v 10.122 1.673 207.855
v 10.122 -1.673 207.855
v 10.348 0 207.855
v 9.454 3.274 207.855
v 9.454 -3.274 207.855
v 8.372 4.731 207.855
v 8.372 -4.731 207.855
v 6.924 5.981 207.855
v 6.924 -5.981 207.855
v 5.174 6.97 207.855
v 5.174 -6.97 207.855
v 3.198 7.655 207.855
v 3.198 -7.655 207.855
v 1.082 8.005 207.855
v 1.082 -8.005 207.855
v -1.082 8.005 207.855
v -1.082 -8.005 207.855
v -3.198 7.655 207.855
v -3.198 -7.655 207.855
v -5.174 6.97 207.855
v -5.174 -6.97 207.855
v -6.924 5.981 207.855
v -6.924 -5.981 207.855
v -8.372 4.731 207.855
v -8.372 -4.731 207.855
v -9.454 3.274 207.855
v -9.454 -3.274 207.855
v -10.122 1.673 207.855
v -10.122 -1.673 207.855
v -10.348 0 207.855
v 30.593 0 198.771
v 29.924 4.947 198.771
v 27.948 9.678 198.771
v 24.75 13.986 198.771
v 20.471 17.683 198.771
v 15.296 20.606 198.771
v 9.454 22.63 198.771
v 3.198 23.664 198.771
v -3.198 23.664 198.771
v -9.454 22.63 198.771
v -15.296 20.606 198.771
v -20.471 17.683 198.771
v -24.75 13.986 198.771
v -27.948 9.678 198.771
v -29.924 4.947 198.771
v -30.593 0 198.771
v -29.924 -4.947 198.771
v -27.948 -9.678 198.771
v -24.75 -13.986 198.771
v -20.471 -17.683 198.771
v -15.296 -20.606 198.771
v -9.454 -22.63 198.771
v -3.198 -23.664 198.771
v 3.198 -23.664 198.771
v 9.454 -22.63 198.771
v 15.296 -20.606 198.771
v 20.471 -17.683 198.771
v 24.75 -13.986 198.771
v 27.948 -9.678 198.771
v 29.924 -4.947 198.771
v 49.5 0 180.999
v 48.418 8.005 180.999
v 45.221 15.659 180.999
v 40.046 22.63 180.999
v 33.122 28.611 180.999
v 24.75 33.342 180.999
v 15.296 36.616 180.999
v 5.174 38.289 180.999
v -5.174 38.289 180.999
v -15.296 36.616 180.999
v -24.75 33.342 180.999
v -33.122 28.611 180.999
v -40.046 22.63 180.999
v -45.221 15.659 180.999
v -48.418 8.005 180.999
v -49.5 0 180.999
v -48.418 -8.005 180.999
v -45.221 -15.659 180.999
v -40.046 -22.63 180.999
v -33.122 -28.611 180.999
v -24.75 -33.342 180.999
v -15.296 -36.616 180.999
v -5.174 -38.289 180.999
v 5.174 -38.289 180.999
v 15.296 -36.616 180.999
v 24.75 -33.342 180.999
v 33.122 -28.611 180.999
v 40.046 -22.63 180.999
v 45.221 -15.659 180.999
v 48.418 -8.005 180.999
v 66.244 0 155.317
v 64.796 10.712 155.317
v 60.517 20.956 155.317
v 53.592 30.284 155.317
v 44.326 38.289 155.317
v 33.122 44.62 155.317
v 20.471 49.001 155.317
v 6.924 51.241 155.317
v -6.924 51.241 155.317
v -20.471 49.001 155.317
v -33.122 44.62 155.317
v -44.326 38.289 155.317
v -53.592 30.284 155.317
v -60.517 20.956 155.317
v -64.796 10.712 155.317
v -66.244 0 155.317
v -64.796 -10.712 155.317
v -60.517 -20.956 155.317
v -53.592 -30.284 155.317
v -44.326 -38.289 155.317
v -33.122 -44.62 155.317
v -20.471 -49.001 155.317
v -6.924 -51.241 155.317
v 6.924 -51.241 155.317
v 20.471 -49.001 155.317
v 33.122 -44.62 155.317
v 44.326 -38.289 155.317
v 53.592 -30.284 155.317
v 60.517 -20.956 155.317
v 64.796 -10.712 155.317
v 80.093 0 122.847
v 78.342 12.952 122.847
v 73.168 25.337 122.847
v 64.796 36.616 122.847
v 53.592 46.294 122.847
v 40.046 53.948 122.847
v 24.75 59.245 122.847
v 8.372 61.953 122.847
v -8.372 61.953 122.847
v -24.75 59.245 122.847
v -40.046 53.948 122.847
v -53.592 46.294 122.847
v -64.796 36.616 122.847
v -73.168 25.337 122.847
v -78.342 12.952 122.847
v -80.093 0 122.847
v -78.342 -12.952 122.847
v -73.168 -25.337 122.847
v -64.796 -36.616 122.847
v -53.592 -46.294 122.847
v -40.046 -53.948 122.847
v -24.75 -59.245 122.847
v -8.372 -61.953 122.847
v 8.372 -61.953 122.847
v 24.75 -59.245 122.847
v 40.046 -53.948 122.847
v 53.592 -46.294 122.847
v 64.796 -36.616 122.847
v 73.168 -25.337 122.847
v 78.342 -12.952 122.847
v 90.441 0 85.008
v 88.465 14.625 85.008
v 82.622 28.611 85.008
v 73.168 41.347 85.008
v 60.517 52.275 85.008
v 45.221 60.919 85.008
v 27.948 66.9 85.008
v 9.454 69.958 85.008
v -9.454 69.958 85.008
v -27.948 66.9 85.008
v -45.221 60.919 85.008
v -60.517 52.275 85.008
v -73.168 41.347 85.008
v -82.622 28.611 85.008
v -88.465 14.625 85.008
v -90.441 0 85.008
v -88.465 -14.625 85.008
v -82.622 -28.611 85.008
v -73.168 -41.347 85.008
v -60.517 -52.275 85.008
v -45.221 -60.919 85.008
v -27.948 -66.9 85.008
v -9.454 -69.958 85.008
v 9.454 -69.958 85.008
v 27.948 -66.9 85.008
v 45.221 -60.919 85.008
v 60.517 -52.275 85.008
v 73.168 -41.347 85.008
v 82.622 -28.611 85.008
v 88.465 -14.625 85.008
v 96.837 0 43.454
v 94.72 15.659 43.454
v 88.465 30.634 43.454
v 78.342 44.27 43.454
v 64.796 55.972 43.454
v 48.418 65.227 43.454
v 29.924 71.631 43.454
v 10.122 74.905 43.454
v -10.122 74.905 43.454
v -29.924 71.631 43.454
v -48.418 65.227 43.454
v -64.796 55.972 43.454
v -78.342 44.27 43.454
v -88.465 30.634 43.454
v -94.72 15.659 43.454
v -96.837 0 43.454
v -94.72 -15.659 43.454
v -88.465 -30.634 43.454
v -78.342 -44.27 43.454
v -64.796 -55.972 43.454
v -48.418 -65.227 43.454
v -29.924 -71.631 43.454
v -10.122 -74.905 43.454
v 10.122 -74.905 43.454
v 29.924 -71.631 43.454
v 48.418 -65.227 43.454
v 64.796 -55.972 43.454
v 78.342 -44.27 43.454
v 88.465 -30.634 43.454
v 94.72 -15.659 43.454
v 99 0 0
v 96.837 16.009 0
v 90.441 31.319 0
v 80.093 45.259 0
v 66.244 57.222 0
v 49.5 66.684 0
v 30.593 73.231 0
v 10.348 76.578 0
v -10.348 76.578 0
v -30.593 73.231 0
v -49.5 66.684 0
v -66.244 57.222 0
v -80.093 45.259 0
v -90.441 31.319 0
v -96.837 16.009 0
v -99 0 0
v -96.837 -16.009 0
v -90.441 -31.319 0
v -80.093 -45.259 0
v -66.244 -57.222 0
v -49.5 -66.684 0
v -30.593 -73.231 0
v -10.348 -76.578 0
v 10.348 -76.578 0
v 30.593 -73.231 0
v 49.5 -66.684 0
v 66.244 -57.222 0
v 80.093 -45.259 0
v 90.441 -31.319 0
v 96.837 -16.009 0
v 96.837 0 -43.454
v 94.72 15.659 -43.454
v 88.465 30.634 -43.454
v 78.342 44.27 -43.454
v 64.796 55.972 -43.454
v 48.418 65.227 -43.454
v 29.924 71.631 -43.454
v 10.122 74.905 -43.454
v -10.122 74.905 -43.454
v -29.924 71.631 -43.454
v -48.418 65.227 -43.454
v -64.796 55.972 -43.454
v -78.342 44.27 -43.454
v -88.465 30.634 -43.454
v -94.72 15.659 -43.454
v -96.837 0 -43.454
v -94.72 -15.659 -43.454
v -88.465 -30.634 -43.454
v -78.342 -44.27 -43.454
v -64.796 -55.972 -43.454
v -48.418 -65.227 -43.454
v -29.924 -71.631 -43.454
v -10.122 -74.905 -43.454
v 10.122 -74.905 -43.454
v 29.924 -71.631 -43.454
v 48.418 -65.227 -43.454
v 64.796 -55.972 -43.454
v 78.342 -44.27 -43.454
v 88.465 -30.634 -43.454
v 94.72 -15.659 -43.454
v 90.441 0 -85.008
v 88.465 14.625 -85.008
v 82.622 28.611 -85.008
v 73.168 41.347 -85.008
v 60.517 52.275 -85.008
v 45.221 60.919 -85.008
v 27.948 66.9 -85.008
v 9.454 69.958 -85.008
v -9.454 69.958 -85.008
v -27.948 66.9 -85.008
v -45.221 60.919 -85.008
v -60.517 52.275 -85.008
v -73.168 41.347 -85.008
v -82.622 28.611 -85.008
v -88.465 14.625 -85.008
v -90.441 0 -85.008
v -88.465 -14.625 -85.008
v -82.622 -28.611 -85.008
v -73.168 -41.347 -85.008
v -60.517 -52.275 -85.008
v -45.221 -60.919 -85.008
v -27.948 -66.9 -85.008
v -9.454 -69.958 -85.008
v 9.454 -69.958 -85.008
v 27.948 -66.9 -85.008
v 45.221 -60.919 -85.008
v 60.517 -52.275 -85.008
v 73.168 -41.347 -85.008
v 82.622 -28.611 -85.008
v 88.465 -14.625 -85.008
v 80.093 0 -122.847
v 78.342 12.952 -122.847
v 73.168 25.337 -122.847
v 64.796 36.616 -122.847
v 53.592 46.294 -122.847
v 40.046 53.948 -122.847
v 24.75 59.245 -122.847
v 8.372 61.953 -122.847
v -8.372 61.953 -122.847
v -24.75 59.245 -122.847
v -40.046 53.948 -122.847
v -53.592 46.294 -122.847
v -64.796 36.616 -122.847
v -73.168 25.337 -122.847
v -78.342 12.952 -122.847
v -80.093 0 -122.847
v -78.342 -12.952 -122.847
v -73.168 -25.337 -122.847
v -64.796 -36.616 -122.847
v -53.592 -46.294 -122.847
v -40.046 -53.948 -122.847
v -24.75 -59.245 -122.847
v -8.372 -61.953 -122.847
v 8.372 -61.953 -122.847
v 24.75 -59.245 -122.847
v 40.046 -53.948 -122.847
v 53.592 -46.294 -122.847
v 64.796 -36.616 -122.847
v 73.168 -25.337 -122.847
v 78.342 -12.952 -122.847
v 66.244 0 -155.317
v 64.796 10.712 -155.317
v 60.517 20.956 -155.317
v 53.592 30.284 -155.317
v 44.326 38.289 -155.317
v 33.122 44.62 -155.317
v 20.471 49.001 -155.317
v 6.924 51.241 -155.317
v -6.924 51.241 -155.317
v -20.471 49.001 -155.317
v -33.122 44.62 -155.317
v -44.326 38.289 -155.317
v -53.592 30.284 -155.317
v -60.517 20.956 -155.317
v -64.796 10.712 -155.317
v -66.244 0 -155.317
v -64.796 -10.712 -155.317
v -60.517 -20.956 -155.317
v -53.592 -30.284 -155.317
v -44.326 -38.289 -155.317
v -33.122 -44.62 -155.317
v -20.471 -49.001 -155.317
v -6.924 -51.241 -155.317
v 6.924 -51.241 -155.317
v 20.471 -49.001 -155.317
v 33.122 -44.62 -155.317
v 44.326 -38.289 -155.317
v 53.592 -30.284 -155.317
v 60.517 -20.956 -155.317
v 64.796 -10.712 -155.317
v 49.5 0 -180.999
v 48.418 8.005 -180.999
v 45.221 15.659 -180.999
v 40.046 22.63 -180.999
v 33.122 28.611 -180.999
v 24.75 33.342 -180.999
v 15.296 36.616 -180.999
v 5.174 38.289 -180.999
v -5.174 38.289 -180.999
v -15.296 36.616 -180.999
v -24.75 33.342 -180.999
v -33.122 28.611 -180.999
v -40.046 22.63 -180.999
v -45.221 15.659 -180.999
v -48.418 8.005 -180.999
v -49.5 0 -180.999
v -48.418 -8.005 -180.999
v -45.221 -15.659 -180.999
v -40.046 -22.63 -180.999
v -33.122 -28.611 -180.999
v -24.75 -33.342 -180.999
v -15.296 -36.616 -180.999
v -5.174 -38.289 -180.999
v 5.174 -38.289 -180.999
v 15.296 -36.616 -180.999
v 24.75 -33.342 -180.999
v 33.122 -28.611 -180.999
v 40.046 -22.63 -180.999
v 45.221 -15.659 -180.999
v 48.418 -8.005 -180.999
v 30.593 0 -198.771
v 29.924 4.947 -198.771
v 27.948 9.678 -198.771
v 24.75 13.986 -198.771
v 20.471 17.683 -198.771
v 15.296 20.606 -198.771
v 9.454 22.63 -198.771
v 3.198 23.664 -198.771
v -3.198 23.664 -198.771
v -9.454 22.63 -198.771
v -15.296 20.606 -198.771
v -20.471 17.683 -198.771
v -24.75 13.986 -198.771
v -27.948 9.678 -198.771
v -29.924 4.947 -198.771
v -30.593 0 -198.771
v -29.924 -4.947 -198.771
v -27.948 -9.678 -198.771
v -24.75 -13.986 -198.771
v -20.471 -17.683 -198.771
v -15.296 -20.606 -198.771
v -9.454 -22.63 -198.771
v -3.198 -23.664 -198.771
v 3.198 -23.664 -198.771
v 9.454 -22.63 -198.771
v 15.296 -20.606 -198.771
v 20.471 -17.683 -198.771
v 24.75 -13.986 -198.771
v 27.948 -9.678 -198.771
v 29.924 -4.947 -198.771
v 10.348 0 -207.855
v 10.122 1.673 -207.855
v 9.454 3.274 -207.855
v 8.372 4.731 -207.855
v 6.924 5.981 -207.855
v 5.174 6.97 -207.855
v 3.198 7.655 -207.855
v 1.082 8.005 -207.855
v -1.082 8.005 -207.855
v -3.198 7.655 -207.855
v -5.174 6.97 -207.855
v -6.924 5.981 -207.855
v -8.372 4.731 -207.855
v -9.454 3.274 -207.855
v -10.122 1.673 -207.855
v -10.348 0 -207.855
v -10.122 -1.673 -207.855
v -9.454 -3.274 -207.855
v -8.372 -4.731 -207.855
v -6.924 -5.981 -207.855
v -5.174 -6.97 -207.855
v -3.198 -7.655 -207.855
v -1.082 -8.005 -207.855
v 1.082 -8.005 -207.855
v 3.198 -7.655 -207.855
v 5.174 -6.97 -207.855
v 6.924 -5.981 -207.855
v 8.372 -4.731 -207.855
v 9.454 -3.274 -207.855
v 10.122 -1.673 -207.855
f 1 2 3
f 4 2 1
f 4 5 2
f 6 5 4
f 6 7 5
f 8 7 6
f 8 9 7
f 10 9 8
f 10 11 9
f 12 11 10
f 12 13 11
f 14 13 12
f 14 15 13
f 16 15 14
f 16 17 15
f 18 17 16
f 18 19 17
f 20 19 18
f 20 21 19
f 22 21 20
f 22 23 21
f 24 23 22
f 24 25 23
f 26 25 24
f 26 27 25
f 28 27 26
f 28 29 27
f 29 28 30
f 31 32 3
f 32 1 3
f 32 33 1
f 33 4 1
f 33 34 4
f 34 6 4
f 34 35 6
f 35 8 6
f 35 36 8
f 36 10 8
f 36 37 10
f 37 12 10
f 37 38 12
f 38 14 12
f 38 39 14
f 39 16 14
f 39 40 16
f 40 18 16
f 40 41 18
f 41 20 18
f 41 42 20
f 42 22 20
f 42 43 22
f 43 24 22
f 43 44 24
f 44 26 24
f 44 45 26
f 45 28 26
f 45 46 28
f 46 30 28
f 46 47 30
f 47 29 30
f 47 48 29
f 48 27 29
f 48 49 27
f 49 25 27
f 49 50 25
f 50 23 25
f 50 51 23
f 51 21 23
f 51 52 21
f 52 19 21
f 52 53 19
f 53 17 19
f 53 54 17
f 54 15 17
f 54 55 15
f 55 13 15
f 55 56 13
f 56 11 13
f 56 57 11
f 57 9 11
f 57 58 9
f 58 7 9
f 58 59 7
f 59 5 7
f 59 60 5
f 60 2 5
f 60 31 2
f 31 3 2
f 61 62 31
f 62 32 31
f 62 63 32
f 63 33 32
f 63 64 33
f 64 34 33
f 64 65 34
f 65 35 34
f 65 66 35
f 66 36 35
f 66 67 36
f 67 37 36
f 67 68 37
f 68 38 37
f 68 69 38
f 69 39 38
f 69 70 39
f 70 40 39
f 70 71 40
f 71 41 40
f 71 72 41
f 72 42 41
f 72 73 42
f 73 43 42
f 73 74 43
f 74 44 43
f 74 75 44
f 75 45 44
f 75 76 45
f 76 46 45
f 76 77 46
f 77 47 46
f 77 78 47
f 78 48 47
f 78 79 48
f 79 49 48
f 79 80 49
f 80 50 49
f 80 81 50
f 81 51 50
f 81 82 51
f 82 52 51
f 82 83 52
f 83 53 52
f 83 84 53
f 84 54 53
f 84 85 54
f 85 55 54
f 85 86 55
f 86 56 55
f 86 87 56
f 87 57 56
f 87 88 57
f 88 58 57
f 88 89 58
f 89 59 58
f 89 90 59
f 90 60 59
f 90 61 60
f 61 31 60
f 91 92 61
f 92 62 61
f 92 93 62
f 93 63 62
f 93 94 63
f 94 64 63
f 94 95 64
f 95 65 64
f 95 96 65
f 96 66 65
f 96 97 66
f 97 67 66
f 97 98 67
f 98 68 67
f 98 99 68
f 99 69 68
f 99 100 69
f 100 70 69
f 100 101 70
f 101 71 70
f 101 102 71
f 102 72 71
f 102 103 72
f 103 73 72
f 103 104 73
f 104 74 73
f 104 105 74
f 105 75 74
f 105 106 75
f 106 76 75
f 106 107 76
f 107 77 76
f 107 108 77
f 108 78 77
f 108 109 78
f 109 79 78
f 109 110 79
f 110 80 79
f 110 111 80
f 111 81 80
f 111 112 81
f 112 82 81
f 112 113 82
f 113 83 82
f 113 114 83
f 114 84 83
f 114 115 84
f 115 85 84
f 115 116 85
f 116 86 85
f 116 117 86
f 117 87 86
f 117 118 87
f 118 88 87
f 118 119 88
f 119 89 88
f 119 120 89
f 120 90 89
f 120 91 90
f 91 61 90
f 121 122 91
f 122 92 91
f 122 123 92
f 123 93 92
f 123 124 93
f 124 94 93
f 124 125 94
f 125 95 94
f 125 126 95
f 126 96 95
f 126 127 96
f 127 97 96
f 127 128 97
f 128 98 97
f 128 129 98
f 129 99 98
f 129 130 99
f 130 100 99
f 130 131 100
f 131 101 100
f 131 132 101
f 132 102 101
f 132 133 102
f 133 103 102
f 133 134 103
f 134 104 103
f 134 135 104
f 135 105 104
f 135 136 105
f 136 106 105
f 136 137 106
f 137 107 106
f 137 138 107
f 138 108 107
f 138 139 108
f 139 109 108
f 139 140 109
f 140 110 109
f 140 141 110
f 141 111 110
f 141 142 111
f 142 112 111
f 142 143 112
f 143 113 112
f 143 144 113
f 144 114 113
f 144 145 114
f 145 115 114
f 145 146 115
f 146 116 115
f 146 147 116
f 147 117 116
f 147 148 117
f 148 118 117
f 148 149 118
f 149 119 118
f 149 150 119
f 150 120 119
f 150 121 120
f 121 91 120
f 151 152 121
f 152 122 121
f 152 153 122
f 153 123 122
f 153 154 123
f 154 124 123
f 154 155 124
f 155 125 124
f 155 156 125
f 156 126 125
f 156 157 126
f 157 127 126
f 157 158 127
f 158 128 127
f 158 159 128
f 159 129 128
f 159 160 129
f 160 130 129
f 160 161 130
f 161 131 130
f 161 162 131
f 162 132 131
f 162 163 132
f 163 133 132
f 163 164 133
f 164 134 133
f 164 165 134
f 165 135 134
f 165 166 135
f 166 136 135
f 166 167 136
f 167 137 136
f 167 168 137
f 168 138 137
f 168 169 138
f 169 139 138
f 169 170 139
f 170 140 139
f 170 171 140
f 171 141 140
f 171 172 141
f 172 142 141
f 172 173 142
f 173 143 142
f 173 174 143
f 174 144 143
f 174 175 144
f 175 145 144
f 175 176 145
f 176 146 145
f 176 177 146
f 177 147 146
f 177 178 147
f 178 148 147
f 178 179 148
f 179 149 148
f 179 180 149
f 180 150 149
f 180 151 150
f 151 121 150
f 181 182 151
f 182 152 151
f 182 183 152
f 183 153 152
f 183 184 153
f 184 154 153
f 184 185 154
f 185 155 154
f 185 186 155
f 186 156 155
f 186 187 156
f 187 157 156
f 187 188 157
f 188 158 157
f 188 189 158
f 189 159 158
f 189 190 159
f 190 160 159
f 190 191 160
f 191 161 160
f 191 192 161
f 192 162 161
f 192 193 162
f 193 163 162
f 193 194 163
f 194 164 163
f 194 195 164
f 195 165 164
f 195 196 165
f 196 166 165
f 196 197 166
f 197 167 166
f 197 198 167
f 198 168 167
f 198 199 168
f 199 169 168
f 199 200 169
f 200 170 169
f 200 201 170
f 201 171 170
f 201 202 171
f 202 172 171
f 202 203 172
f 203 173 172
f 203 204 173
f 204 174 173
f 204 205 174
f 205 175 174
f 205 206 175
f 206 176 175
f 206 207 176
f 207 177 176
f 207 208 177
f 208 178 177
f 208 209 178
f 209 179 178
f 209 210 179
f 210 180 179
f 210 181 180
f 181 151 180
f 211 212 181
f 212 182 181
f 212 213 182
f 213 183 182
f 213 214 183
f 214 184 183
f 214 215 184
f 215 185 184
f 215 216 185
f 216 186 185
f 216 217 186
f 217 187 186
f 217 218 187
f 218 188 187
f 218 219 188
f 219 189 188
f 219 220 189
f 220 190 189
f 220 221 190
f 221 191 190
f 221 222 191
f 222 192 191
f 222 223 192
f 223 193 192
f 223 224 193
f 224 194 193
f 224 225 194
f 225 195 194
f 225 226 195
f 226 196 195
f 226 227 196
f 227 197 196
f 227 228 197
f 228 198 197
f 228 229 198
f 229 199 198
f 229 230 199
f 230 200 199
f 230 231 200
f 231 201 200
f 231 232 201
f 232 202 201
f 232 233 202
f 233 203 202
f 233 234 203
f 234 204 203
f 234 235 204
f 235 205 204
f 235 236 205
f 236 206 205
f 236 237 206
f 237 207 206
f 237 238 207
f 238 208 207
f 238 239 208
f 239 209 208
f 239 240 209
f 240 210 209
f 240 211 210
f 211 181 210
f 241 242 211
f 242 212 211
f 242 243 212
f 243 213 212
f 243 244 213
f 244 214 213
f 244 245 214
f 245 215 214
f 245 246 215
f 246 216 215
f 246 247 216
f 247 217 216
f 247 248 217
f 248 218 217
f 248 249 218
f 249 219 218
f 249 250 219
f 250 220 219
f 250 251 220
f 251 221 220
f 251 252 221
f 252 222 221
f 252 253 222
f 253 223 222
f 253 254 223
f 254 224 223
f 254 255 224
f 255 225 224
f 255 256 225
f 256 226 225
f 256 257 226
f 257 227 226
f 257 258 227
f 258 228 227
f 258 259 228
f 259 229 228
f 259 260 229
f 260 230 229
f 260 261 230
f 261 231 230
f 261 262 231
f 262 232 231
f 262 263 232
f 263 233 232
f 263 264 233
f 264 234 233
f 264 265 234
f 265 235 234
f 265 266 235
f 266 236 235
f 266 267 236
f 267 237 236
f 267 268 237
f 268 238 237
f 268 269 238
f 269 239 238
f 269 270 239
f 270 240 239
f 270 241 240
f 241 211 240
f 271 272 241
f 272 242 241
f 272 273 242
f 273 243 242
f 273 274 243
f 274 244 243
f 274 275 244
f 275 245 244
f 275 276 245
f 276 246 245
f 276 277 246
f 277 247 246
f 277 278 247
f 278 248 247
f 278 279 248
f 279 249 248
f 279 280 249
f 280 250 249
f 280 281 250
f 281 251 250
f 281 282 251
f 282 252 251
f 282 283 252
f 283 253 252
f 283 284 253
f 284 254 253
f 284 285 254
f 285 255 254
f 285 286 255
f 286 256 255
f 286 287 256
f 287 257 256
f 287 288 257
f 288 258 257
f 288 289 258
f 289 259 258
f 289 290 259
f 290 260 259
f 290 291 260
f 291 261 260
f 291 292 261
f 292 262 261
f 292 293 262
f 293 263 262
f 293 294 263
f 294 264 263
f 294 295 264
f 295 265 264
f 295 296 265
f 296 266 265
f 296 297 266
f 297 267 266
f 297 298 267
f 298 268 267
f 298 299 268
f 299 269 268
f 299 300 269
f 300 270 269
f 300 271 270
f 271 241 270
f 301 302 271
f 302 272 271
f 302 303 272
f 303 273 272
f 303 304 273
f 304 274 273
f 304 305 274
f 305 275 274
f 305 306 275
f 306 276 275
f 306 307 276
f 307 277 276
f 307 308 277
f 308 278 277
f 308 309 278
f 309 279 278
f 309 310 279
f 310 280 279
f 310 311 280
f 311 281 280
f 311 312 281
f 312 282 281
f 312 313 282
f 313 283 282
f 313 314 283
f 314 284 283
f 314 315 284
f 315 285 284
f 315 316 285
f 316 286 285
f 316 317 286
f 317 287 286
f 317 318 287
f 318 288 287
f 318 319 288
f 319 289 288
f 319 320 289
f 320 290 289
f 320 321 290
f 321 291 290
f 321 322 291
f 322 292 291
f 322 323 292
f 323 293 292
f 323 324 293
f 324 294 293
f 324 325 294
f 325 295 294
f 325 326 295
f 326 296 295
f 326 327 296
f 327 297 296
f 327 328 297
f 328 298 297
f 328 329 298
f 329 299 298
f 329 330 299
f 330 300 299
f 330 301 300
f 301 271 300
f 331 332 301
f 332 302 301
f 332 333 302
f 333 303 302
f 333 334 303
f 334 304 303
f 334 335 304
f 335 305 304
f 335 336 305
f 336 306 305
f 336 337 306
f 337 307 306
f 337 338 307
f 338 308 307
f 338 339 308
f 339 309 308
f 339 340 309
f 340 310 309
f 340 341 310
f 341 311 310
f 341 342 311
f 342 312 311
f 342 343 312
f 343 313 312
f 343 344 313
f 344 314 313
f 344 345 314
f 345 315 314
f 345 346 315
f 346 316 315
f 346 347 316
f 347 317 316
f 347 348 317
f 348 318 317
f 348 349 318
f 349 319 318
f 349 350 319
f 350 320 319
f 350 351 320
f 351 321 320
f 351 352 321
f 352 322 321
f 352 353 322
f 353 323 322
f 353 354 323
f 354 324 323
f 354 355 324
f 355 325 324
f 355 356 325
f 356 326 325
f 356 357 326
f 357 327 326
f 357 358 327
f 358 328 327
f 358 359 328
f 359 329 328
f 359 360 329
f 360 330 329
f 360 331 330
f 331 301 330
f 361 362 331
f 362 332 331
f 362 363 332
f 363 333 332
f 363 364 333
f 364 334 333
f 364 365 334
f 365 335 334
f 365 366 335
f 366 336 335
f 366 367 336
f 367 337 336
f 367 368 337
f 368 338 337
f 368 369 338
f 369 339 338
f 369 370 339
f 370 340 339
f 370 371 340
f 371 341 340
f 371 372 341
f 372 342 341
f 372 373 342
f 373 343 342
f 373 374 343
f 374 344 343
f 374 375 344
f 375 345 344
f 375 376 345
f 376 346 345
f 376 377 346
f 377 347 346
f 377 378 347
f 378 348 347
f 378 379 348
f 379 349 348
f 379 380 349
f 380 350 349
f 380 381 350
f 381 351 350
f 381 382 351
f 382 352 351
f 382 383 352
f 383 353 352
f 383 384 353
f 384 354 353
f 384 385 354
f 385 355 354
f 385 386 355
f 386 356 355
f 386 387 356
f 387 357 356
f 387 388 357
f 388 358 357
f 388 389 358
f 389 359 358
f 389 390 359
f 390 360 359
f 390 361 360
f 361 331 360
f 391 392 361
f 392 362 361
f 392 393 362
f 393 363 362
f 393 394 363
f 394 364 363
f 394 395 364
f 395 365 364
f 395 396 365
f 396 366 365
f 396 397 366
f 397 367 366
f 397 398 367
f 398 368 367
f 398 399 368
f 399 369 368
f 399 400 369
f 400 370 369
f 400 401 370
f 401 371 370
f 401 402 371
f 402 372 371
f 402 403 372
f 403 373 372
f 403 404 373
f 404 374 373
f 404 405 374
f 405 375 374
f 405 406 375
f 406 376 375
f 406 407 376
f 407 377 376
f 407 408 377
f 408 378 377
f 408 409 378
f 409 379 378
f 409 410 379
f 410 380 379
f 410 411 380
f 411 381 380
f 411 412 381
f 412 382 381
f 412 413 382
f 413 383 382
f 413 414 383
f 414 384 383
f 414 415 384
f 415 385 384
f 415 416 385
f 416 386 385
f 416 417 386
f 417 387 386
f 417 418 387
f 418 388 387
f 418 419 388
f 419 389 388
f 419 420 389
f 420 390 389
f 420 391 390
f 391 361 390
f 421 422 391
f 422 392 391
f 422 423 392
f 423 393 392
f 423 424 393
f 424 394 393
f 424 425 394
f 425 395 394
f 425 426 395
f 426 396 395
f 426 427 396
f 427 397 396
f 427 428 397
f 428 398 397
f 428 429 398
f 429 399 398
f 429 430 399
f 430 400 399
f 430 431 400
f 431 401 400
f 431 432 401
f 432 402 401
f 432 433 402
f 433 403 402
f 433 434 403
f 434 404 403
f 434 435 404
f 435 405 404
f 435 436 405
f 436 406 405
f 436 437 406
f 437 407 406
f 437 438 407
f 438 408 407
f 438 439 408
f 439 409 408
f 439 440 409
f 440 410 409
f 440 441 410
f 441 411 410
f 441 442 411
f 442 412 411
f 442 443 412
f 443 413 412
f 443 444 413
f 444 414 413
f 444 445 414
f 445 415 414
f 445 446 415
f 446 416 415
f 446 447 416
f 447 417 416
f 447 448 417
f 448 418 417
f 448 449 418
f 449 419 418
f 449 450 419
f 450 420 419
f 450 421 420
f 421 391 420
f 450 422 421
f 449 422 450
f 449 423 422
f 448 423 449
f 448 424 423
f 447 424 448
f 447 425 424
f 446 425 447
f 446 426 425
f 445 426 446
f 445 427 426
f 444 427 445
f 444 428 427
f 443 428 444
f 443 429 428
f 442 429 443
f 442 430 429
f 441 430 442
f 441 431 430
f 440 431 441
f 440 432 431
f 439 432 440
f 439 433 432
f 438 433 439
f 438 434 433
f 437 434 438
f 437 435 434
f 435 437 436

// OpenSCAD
// Generated by SolidPython 1.0.1 on 2020-07-29 00:46:48


scale(v = [9, 7, 19]) {
	sphere(r = 11);
}
/***********************************************
*********      SolidPython code:      **********
************************************************
 
# import packages: SolidPython
from solid import *
from solid.utils import *
from itertools import chain, combinations, permutations


class Resize:

    def __init__(self, scad_file):
        self.scad_file = scad_file
        #self.scad_file = import_scad(scad_file)
        # cone/cylinder param:
        self.r1 = 0
        self.r2 = 0
        self.h = 0
        # rectangular prism param:
        self.w = 0
        self.l = 0
        # ellipse param:
        self.r = 0

    # import OpenScad code (file name corresponds to shape)


    # classify shape + parameters
    def assign(self, param1, param2, param3):
        if self.scad_file == 'cone.scad':
            self.r1 = param1
            self.r2 = param2
            self.h = param3
        elif self.scad_file == 'cylinder.scad':
            self.r1 = param1
            self.r2 = param2
            self.h = param3
        elif self.scad_file == 'rectangularPrism.scad':
            self.h = param1
            self.l = param2
            self.w = param3
        else:
            self.r = param1
            self.h = param2

    # resize parameters
    def iterate(self):
        x = range(3, 20, 2)
        i = 1
        if self.scad_file == 'cone.scad':
            tempList = list(permutations(x, 2))
            for temp in tempList:
                param1 = temp[0]
                param2 = temp[1]
                filepath = 'produced_scad_files/' + 'cone' + str(param1) + '_' + str(param2) + '_' + '.scad'
                scad_render_to_file(cylinder(h=param1, r1=param2, r2=0), filepath)

        elif self.scad_file == 'cylinder.scad':
            tempList = list(permutations(x, 3))
            for temp in tempList:
                param1 = temp[0]
                param2 = temp[1]
                filepath = 'produced_scad_files/' + 'cylinder' + str(param1) + '_' + str(param2) + '_' + '.scad'
                scad_render_to_file(cylinder(h=param1, r1=param2, r2=param2), filepath)

        elif self.scad_file == 'rectangularPrism.scad':
            tempList = list(permutations(x, 3))
            for temp in tempList:
                param1 = temp[0]
                param2 = temp[1]
                param3 = temp[2]
                filepath = 'produced_scad_files/' + 'rectangularPrism' + str(param1) + '_' + str(param2) + '_' + str(
                    param3) + '.scad'
                scad_render_to_file(cube(size=(param1, param2, param3)), filepath)

        elif self.scad_file == 'ellipse.scad':
            tempList = list(permutations(x, 4))
            for temp in tempList:
                param1 = temp[0]
                param2 = temp[1]
                param3 = temp[2]
                param4 = temp[3]
                filepath = 'produced_scad_files/' + 'ellipse' + str(param1) + '_' + str(param2) + '_' + str(param3) + '_' + str(param4) + '.scad'
                scad_render_to_file(scale([param1, param2, param3])(sphere(r=param4)), filepath)

    def render_to_scadfile(self):
        scad_render_to_file(scad, 'example.scad') 
 
************************************************/
